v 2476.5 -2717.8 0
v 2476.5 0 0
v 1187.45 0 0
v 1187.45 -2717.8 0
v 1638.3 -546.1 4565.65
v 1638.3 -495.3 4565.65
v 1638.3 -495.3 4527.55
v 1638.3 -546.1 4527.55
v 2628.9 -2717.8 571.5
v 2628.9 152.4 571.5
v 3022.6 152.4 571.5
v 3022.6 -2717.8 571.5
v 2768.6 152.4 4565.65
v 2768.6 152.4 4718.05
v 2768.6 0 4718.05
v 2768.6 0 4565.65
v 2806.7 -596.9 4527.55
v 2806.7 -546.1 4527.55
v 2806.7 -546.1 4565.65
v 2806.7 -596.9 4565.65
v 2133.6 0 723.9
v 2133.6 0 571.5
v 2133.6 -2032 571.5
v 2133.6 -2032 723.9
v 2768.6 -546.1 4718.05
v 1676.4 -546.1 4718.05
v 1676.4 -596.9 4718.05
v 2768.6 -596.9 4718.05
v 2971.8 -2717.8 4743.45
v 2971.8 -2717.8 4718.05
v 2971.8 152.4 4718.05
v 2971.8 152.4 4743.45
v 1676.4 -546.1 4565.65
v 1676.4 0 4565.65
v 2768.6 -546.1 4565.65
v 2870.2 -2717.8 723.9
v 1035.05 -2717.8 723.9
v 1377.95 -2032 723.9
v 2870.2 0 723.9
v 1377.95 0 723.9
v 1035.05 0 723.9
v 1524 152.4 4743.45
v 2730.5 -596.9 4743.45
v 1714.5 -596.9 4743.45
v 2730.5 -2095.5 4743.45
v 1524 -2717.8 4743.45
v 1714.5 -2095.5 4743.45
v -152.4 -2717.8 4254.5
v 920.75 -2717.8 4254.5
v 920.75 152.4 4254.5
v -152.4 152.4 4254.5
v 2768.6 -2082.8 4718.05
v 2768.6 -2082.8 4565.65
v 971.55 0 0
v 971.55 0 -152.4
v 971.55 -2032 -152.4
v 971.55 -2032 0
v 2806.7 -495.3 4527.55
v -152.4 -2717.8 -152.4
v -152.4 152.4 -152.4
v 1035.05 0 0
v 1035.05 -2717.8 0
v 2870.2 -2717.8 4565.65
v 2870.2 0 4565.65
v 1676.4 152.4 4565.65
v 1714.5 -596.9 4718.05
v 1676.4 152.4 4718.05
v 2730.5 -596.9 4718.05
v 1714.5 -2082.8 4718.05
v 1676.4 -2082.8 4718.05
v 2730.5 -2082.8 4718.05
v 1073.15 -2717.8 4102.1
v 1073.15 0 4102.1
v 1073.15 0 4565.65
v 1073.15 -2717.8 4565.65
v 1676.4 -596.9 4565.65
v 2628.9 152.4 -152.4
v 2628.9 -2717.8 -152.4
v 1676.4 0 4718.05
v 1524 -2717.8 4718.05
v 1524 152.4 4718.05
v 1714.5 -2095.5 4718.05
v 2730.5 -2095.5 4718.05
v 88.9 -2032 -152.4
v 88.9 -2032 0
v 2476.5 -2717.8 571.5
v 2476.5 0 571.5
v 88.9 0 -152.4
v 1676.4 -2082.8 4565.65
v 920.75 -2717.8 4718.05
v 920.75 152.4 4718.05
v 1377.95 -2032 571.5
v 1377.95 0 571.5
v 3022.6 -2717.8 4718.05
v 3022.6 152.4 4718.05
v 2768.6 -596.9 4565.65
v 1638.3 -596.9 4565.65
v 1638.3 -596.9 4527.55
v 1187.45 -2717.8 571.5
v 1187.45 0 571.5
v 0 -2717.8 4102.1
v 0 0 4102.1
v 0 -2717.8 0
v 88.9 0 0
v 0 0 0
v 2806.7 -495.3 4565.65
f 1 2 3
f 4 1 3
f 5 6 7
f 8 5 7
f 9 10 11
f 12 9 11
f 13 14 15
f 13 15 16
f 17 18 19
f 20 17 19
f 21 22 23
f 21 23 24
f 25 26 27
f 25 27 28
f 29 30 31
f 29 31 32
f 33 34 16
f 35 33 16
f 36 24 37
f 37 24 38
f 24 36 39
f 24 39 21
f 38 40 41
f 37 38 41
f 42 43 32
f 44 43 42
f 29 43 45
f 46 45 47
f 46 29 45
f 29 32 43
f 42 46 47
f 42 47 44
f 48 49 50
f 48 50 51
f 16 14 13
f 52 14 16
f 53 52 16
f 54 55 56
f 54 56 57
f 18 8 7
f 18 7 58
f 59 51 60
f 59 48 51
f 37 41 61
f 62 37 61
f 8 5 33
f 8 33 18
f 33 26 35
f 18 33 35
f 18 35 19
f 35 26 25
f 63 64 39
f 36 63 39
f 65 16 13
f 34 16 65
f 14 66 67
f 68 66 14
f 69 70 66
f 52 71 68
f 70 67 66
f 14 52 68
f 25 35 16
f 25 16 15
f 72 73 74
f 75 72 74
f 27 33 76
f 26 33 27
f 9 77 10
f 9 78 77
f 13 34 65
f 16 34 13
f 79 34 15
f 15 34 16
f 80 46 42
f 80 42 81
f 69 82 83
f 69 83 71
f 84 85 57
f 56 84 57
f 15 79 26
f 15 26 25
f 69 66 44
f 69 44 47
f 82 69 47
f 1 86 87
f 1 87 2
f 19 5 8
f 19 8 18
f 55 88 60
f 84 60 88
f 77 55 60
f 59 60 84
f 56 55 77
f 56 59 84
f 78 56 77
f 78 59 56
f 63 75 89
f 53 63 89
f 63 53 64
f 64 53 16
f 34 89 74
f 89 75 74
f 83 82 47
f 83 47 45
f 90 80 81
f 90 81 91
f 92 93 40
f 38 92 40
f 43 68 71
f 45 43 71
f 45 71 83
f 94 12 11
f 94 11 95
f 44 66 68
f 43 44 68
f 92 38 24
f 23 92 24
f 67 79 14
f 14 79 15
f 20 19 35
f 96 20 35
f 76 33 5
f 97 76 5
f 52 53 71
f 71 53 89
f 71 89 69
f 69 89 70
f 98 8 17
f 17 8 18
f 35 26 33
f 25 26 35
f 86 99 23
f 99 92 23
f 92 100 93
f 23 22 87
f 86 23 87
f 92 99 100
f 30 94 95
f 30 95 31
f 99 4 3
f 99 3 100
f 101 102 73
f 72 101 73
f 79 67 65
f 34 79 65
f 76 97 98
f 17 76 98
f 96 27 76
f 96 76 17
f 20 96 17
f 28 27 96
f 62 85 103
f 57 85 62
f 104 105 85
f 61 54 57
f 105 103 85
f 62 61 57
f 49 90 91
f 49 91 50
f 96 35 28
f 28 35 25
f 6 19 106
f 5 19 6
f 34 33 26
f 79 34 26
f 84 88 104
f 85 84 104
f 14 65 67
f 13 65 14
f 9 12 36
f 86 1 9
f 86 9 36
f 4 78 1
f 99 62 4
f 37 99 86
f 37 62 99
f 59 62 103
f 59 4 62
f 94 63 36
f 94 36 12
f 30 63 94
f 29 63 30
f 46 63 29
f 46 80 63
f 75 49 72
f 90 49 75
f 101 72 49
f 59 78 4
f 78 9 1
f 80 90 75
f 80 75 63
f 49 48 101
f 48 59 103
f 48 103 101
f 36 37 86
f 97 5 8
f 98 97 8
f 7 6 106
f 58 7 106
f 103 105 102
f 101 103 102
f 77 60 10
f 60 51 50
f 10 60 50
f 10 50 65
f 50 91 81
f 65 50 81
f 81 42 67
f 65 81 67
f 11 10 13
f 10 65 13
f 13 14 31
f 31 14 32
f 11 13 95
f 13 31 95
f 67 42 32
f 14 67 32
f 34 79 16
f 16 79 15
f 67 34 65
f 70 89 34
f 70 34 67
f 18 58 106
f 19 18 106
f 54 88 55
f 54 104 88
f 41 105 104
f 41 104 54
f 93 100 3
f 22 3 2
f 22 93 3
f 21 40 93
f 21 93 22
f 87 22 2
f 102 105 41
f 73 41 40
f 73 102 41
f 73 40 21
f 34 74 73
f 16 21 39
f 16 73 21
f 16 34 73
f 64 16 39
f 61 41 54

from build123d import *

# Parameters (mm, degrees)
F0_W      = 38.1
F0_H      = 152.4
F1_DEPTH  = 2717.8
F0_W_2    = 882.65
F0_W_3    = 755.65
F2_DEPTH  = 2717.8
F3_DEPTH  = 2032
F4_DEPTH  = 152.4
F0_W_4    = 1092.2
F5_DEPTH  = 546.1
F5_FACE_W = 1092.2
F5_FACE_H = 152.4
F6_DEPTH  = 152.4
F7_W      = 1016
F7_H      = 1498.6
F8_DEPTH  = 25.4
F9_W      = 1092.2
F9_H      = 152.4
F10_DEPTH = 50.8
F11_DEPTH = 50.8
F12_W     = 635
F12_H     = 152.4
F13_DEPTH = 1092.2


with BuildPart() as f1:
    # F0 (on Front) → F1 (new body)
    with BuildSketch(Plane.XZ):
        Polygon((88.9, 0), (0, 0), (0, 4102.1), (1073.15, 4102.1), (1073.15, 4565.65), (1676.4, 4565.65), (1676.4, 4718.05), (2768.6, 4718.05), (2768.6, 4565.65), (2870.2, 4565.65), (2870.2, 723.9), (2133.6, 723.9), (2133.6, 571.5), (2476.5, 571.5), (2476.5, 0), (1187.45, 0), (1187.45, 571.5), (1339.85, 571.5), (1339.85, 723.9), (1035.05, 723.9), (1035.05, 0), (971.55, 0), (971.55, -152.4), (2628.9, -152.4), (2628.9, 571.5), (3022.6, 571.5), (3022.6, 4718.05), (2971.8, 4718.05), (2971.8, 4743.45), (1524, 4743.45), (1524, 4718.05), (920.75, 4718.05), (920.75, 4254.5), (-152.4, 4254.5), (-152.4, -152.4), (88.9, -152.4), align=None)
        with Locations((1358.9, 647.7)):
            Rectangle(F0_W, F0_H)
    extrude(amount=F1_DEPTH)

    # F0 (on Front) → F2 (join)
    with BuildSketch(Plane.XZ):
        with Locations((530.225, -76.2)):
            Rectangle(F0_W_2, F0_H)
        with Locations((1755.775, 647.7)):
            Rectangle(F0_W_3, F0_H)
    extrude(amount=F2_DEPTH)

    # F0 (on Front) → F3 (cut)
    with BuildSketch(Plane.XZ):
        with Locations((1755.775, 647.7)):
            Rectangle(F0_W_3, F0_H)
        with Locations((530.225, -76.2)):
            Rectangle(F0_W_2, F0_H)
    extrude(amount=F3_DEPTH, mode=Mode.SUBTRACT)

    # F0 (on Front) → F4 (join)
    with BuildSketch(Plane.XZ):
        Polygon((0, 4102.1), (0, 0), (88.9, 0), (971.55, 0), (1035.05, 0), (1035.05, 723.9), (1339.85, 723.9), (1377.95, 723.9), (2133.6, 723.9), (2870.2, 723.9), (2870.2, 4565.65), (2768.6, 4565.65), (1676.4, 4565.65), (1073.15, 4565.65), (1073.15, 4102.1), align=None)
        Polygon((88.9, 0), (0, 0), (0, 4102.1), (1073.15, 4102.1), (1073.15, 4565.65), (1676.4, 4565.65), (1676.4, 4718.05), (2768.6, 4718.05), (2768.6, 4565.65), (2870.2, 4565.65), (2870.2, 723.9), (2133.6, 723.9), (2133.6, 571.5), (2476.5, 571.5), (2476.5, 0), (1187.45, 0), (1187.45, 571.5), (1339.85, 571.5), (1339.85, 723.9), (1035.05, 723.9), (1035.05, 0), (971.55, 0), (971.55, -152.4), (2628.9, -152.4), (2628.9, 571.5), (3022.6, 571.5), (3022.6, 4718.05), (2971.8, 4718.05), (2971.8, 4743.45), (1524, 4743.45), (1524, 4718.05), (920.75, 4718.05), (920.75, 4254.5), (-152.4, 4254.5), (-152.4, -152.4), (88.9, -152.4), align=None)
        Polygon((1377.95, 571.5), (1339.85, 571.5), (1187.45, 571.5), (1187.45, 0), (2476.5, 0), (2476.5, 571.5), (2133.6, 571.5), align=None)
        with Locations((1755.775, 647.7)):
            Rectangle(F0_W_3, F0_H)
        with Locations((1358.9, 647.7)):
            Rectangle(F0_W, F0_H)
        with Locations((530.225, -76.2)):
            Rectangle(F0_W_2, F0_H)
    extrude(amount=-F4_DEPTH)

    # F7 (on face) → F8 (cut, through all)
    with BuildSketch(Plane(origin=(0, 0, 4718.05), x_dir=(1, 0, 0), z_dir=(0, 0, -1))):
        with Locations((2222.5, 1346.2)):
            Rectangle(F7_W, F7_H)
    extrude(amount=-F8_DEPTH, mode=Mode.SUBTRACT)

    # F12 (on face) → F13 (join)
    with BuildSketch(Plane.YZ.offset(1676.4)):
        with Locations((-2400.3, 4641.85)):
            Rectangle(F12_W, F12_H)
    extrude(amount=F13_DEPTH)


with BuildPart() as f5:
    # F0 (on Front) → F5 (new body)
    with BuildSketch(Plane.XZ):
        with Locations((2222.5, 4641.85)):
            Rectangle(F0_W_4, F0_H)
    extrude(amount=F5_DEPTH)


with BuildPart() as f6:
    # F5_face (on face) → F6 (new body)
    with BuildSketch(Plane(origin=(2222.5, 0, 4641.85), x_dir=(1, 0, 0), z_dir=(0, 1, 0))):
        Rectangle(F5_FACE_W, F5_FACE_H)
    extrude(amount=F6_DEPTH)


with BuildPart() as f10:
    # F9 (on face) → F10 (new body)
    with BuildSketch(Plane.XZ.offset(546.1)):
        with Locations((2222.5, 4641.85)):
            Rectangle(F9_W, F9_H)
        Polygon((2806.7, 4565.65), (2768.6, 4565.65), (1676.4, 4565.65), (1638.3, 4565.65), (1638.3, 4527.55), (2806.7, 4527.55), align=None)
    extrude(amount=F10_DEPTH)


with BuildPart() as f11:
    # F9 (on face) → F11 (new body)
    with BuildSketch(Plane.XZ.offset(546.1)):
        Polygon((2806.7, 4565.65), (2768.6, 4565.65), (1676.4, 4565.65), (1638.3, 4565.65), (1638.3, 4527.55), (2806.7, 4527.55), align=None)
    extrude(amount=-F11_DEPTH)


solid = Compound([f1.part, f5.part, f6.part, f10.part, f11.part])
